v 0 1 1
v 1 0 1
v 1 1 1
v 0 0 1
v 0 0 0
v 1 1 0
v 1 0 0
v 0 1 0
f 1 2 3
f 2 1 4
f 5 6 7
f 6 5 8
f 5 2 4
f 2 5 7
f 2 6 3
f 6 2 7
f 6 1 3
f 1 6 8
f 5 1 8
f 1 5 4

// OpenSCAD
// string searches

simpleSearch1=search("a","abcdabcd");
echo(str("Characters in string (\"a\"): ",simpleSearch1));

simpleSearch2=search("adeq","abcdeabcd",0);
echo(str("Characters in string (\"adeq\"): ",simpleSearch2));

sTable1=[ ["a",1],["b",2],["c",3],["d",4],["a",5],["b",6],["c",7],["d",8],["e",9] ];
s1= search("abe",sTable1);
echo(str("Default string search (\"abe\"): ",s1));

sTable2=[ ["a",1],["b",2],["c",3],["d",4],["a",5],["b",6],["c",7],["d",8],["e",9],["a",10],["a",11] ];
s2= search("abe",sTable2,0);
echo(str("Return all matches for string search (\"abe\"): ",s2));

sTable3=[ ["a",1],["b",2],["c",3],["d",4],["a",5],["b",6],["c",7],["d",8],["e",9],["a",10],["a",11] ];
s3= search("abe",sTable3,2);
echo(str("Return up to 2 matches for string search (\"abe\"): ",s3));

sTable4=[ [1,"a",[20]],[2,"b",21],[3,"c",22],[4,"d",23],[5,"a",24],[6,"b",25],[7,"c",26],[8,"d",27],[9,"e",28],[10,"a",29],[11,"a",30] ];
s4= search("aebe",sTable4,2,1);
echo(str("Return up to 2 matches for string search; alternate columns (\"aebe\"): ",s4));

// s5= search("abe",sTable4,2,1,3); // bounds checking needs fixing.
// echo(str("Return up to 2 matches for string search; alternate columns: ",s4));

// Value searches
vTable1=[1,2,3];
v1 = search(3, vTable1);
echo(str("Default value search (3): ", v1));
vTable1=[1,2,3];
v2 = search(4, vTable1);
echo(str("Value not found (4): ", v2));
vTable2=[[0,1],[1,2],[2,3]];
v3 = search([[1,2]], vTable2);
echo(str("Value vector ([1,2]): ", v3));

// number searches
nTable1=[ [1,"a"],[3,"b"],[2,"c"],[4,"d"],[1,"a"],[7,"b"],[2,"c"],[8,"d"],[9,"e"],[10,"a"],[1,"a"] ];
n1 = search(7,nTable1);
echo(str("Default number search (7): ",n1));
n2 = search(1,nTable1,0);
echo(str("Return all matches for number search (1): ",n2));
n3 = search(1,nTable1,2);
echo(str("Return up to 2 matches for number search (1): ",n3));

// list searches
lTable1=[ [1,"a"],[3,"b"],[2,"c"],[4,"d"],[1,"a"],[7,"b"],[2,"c"],[8,"d"],[9,"e"],[10,"a"],[1,"a"] ];
lSearch1=[1,3,1000];
l1=search(lSearch1,lTable1);
echo(str("Default list number search (",lSearch1,"): ",l1));

lTable2=[ ["cat",1],["b",2],["c",3],["dog",4],["a",5],["b",6],["c",7],["d",8],["e",9],["apple",10],["a",11] ];
lSearch2=["b","zzz","a","c","apple","dog"];
l2=search(lSearch2,lTable2);
echo(str("Default list string search (",lSearch2,"): ",l2));

lTable3=[ ["cat",1],["b",2],["c",3],[4,"dog"],["a",5],["b",6],["c",7],["d",8],["e",9],["apple",10],["a",11] ];
lSearch3=["b",4,"zzz","c","apple",500,"a",""];
l3=search(lSearch3,lTable3);
echo(str("Default list mixed search (",lSearch3,"): ",l3));

l4=search(lSearch3,lTable3,0);
echo(str("Return all matches for mixed search (",lSearch3,"): ",l4));

lSearch5=[1,"zz","dog",500,11];
l5=search(lSearch5,lTable3,0,1);
echo(str("Return all matches for mixed search; alternate columns (",lSearch5,"): ",l5));

// causing warnings
lTableW1=[ ["a",1],123 ];
echo(search("a", lTableW1, num_returns_per_match=0)); 

lTableW2=[ ["a",1],"string" ];
echo(search("a", lTableW2, num_returns_per_match=0)); 

lTableW3=[ ["b",1] ];
echo(search("a", lTableW3, num_returns_per_match=0)); 

lTableW4=[ ["a",1] ];
echo(search("abcd", lTableW4, num_returns_per_match=0)); 

echo(search("abcd", "xyz", num_returns_per_match=0)); 

lTableW5=[ ["a",1],undef,1/0,-1/0 ];
echo(search("a", lTableW5, num_returns_per_match=0)); 

lTableW6=[ ["a",1],-1/0];
echo(search("a", lTableW6, num_returns_per_match=0)); 

// Mismatches are silently not-equal
mixedTable=[ ["a", 1], [2, 2], ["b", 3] ];
echo(search("b", mixedTable));
echo(search(2, mixedTable));

// for completeness
cube(1.0);
